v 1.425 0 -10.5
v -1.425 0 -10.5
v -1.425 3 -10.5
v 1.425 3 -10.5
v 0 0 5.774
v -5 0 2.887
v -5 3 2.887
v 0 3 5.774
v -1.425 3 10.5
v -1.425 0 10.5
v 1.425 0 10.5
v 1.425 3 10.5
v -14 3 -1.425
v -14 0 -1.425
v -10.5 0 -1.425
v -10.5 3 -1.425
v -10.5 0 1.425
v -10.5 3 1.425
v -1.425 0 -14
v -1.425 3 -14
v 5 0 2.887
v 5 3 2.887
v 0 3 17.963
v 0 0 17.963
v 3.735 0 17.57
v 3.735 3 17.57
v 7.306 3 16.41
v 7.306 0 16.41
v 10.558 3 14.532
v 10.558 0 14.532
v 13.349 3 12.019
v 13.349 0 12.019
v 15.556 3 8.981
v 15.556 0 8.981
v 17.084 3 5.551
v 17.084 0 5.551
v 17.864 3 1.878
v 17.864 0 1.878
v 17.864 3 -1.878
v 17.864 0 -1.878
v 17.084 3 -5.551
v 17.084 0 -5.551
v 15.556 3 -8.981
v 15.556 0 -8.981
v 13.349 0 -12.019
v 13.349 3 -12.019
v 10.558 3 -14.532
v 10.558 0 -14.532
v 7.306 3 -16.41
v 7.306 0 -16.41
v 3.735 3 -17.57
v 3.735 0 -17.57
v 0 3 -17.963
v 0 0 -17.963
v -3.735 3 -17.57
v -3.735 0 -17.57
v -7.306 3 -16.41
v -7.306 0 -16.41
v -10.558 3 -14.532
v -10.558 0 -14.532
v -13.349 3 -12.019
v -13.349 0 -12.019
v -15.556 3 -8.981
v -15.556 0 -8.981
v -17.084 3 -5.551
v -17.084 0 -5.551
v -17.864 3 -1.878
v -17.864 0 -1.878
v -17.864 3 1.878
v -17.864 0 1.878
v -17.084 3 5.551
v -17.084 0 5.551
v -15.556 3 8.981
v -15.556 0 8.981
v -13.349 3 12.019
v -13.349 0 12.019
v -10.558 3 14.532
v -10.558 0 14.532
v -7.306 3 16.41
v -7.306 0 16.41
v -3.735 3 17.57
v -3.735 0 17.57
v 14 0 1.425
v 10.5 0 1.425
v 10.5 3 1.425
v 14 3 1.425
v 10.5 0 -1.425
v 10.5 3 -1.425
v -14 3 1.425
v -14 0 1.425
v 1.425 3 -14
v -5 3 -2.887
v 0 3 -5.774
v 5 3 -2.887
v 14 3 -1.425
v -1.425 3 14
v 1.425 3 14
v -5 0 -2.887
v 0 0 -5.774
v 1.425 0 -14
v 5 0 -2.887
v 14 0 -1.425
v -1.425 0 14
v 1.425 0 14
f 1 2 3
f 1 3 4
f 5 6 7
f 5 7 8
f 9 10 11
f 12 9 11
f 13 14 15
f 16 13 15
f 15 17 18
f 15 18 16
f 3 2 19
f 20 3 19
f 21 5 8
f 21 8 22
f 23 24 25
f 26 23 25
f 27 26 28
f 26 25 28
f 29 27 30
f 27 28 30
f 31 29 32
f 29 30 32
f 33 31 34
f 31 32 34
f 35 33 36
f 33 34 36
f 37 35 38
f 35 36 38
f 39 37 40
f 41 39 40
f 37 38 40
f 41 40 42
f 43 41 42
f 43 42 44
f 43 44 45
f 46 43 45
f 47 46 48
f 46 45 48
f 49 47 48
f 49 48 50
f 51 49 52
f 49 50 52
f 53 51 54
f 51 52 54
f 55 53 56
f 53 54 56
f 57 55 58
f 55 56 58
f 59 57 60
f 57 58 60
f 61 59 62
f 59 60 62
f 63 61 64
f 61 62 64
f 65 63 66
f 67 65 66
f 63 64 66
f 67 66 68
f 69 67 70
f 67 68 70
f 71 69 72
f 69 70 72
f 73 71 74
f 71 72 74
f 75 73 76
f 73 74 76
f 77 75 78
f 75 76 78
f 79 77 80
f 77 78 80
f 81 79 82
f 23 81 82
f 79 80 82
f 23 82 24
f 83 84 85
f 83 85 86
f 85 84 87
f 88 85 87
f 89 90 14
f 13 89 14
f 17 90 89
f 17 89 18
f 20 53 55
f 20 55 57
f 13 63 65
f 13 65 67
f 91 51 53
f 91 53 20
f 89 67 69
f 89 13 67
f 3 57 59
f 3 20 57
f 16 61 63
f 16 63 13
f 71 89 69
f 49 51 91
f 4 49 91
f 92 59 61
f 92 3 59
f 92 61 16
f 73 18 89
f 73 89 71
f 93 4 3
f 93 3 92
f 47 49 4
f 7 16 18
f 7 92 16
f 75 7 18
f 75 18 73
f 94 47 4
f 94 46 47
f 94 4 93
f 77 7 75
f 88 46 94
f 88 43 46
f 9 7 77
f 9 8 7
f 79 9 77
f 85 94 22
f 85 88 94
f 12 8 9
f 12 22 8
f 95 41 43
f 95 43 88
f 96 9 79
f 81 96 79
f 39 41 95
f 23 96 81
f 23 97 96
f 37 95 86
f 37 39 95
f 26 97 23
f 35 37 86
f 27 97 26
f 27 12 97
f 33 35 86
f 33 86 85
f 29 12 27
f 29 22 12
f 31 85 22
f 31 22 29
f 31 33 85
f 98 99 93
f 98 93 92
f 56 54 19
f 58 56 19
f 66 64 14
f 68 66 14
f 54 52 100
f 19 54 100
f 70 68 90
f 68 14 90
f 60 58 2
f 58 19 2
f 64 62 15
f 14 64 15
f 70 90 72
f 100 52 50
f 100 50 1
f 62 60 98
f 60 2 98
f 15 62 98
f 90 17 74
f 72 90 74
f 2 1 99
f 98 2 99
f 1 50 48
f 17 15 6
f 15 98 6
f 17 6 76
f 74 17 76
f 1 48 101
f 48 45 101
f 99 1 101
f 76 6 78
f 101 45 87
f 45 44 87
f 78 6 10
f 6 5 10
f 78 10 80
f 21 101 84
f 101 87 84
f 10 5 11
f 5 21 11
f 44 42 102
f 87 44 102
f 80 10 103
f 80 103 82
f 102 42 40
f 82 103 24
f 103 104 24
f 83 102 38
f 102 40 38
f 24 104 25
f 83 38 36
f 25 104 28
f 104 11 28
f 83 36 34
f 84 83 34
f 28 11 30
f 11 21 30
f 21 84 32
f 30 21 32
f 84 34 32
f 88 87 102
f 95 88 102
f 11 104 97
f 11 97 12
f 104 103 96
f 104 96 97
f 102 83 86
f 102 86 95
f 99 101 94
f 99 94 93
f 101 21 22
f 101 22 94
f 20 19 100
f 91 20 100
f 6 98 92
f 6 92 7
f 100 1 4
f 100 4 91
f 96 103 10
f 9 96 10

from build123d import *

# Parameters (mm, degrees)
SKETCH1_R           = 17.962739212
SKETCH1_W           = 3.5
SKETCH1_H           = 2.85
SKETCH1_W_2         = 2.85
SKETCH1_H_2         = 3.5
BOSS_EXTRUDE1_DEPTH = 3


with BuildPart() as part:
    # Sketch1 → Boss-Extrude1 (new body)
    with BuildSketch(Plane(origin=(0, 0, 0), x_dir=(1, 0, 0), z_dir=(0, 1, 0))):
        with Locations(Location((0, 0, 0), (0, 0, 270))):
            Circle(SKETCH1_R)
        with Locations((-12.25, 0)):
            Rectangle(SKETCH1_W, SKETCH1_H, mode=Mode.SUBTRACT)
        with Locations((0, -12.25)):
            Rectangle(SKETCH1_W_2, SKETCH1_H_2, mode=Mode.SUBTRACT)
        with Locations((0, 12.25)):
            Rectangle(SKETCH1_W_2, SKETCH1_H_2, mode=Mode.SUBTRACT)
        with Locations((12.25, 0)):
            Rectangle(SKETCH1_W, SKETCH1_H, mode=Mode.SUBTRACT)
        Polygon((0, -5.773502692), (5, -2.886751346), (5, 2.886751346), (0, 5.773502692), (-5, 2.886751346), (-5, -2.886751346), align=None, mode=Mode.SUBTRACT)
    extrude(amount=BOSS_EXTRUDE1_DEPTH)


solid = part.part
